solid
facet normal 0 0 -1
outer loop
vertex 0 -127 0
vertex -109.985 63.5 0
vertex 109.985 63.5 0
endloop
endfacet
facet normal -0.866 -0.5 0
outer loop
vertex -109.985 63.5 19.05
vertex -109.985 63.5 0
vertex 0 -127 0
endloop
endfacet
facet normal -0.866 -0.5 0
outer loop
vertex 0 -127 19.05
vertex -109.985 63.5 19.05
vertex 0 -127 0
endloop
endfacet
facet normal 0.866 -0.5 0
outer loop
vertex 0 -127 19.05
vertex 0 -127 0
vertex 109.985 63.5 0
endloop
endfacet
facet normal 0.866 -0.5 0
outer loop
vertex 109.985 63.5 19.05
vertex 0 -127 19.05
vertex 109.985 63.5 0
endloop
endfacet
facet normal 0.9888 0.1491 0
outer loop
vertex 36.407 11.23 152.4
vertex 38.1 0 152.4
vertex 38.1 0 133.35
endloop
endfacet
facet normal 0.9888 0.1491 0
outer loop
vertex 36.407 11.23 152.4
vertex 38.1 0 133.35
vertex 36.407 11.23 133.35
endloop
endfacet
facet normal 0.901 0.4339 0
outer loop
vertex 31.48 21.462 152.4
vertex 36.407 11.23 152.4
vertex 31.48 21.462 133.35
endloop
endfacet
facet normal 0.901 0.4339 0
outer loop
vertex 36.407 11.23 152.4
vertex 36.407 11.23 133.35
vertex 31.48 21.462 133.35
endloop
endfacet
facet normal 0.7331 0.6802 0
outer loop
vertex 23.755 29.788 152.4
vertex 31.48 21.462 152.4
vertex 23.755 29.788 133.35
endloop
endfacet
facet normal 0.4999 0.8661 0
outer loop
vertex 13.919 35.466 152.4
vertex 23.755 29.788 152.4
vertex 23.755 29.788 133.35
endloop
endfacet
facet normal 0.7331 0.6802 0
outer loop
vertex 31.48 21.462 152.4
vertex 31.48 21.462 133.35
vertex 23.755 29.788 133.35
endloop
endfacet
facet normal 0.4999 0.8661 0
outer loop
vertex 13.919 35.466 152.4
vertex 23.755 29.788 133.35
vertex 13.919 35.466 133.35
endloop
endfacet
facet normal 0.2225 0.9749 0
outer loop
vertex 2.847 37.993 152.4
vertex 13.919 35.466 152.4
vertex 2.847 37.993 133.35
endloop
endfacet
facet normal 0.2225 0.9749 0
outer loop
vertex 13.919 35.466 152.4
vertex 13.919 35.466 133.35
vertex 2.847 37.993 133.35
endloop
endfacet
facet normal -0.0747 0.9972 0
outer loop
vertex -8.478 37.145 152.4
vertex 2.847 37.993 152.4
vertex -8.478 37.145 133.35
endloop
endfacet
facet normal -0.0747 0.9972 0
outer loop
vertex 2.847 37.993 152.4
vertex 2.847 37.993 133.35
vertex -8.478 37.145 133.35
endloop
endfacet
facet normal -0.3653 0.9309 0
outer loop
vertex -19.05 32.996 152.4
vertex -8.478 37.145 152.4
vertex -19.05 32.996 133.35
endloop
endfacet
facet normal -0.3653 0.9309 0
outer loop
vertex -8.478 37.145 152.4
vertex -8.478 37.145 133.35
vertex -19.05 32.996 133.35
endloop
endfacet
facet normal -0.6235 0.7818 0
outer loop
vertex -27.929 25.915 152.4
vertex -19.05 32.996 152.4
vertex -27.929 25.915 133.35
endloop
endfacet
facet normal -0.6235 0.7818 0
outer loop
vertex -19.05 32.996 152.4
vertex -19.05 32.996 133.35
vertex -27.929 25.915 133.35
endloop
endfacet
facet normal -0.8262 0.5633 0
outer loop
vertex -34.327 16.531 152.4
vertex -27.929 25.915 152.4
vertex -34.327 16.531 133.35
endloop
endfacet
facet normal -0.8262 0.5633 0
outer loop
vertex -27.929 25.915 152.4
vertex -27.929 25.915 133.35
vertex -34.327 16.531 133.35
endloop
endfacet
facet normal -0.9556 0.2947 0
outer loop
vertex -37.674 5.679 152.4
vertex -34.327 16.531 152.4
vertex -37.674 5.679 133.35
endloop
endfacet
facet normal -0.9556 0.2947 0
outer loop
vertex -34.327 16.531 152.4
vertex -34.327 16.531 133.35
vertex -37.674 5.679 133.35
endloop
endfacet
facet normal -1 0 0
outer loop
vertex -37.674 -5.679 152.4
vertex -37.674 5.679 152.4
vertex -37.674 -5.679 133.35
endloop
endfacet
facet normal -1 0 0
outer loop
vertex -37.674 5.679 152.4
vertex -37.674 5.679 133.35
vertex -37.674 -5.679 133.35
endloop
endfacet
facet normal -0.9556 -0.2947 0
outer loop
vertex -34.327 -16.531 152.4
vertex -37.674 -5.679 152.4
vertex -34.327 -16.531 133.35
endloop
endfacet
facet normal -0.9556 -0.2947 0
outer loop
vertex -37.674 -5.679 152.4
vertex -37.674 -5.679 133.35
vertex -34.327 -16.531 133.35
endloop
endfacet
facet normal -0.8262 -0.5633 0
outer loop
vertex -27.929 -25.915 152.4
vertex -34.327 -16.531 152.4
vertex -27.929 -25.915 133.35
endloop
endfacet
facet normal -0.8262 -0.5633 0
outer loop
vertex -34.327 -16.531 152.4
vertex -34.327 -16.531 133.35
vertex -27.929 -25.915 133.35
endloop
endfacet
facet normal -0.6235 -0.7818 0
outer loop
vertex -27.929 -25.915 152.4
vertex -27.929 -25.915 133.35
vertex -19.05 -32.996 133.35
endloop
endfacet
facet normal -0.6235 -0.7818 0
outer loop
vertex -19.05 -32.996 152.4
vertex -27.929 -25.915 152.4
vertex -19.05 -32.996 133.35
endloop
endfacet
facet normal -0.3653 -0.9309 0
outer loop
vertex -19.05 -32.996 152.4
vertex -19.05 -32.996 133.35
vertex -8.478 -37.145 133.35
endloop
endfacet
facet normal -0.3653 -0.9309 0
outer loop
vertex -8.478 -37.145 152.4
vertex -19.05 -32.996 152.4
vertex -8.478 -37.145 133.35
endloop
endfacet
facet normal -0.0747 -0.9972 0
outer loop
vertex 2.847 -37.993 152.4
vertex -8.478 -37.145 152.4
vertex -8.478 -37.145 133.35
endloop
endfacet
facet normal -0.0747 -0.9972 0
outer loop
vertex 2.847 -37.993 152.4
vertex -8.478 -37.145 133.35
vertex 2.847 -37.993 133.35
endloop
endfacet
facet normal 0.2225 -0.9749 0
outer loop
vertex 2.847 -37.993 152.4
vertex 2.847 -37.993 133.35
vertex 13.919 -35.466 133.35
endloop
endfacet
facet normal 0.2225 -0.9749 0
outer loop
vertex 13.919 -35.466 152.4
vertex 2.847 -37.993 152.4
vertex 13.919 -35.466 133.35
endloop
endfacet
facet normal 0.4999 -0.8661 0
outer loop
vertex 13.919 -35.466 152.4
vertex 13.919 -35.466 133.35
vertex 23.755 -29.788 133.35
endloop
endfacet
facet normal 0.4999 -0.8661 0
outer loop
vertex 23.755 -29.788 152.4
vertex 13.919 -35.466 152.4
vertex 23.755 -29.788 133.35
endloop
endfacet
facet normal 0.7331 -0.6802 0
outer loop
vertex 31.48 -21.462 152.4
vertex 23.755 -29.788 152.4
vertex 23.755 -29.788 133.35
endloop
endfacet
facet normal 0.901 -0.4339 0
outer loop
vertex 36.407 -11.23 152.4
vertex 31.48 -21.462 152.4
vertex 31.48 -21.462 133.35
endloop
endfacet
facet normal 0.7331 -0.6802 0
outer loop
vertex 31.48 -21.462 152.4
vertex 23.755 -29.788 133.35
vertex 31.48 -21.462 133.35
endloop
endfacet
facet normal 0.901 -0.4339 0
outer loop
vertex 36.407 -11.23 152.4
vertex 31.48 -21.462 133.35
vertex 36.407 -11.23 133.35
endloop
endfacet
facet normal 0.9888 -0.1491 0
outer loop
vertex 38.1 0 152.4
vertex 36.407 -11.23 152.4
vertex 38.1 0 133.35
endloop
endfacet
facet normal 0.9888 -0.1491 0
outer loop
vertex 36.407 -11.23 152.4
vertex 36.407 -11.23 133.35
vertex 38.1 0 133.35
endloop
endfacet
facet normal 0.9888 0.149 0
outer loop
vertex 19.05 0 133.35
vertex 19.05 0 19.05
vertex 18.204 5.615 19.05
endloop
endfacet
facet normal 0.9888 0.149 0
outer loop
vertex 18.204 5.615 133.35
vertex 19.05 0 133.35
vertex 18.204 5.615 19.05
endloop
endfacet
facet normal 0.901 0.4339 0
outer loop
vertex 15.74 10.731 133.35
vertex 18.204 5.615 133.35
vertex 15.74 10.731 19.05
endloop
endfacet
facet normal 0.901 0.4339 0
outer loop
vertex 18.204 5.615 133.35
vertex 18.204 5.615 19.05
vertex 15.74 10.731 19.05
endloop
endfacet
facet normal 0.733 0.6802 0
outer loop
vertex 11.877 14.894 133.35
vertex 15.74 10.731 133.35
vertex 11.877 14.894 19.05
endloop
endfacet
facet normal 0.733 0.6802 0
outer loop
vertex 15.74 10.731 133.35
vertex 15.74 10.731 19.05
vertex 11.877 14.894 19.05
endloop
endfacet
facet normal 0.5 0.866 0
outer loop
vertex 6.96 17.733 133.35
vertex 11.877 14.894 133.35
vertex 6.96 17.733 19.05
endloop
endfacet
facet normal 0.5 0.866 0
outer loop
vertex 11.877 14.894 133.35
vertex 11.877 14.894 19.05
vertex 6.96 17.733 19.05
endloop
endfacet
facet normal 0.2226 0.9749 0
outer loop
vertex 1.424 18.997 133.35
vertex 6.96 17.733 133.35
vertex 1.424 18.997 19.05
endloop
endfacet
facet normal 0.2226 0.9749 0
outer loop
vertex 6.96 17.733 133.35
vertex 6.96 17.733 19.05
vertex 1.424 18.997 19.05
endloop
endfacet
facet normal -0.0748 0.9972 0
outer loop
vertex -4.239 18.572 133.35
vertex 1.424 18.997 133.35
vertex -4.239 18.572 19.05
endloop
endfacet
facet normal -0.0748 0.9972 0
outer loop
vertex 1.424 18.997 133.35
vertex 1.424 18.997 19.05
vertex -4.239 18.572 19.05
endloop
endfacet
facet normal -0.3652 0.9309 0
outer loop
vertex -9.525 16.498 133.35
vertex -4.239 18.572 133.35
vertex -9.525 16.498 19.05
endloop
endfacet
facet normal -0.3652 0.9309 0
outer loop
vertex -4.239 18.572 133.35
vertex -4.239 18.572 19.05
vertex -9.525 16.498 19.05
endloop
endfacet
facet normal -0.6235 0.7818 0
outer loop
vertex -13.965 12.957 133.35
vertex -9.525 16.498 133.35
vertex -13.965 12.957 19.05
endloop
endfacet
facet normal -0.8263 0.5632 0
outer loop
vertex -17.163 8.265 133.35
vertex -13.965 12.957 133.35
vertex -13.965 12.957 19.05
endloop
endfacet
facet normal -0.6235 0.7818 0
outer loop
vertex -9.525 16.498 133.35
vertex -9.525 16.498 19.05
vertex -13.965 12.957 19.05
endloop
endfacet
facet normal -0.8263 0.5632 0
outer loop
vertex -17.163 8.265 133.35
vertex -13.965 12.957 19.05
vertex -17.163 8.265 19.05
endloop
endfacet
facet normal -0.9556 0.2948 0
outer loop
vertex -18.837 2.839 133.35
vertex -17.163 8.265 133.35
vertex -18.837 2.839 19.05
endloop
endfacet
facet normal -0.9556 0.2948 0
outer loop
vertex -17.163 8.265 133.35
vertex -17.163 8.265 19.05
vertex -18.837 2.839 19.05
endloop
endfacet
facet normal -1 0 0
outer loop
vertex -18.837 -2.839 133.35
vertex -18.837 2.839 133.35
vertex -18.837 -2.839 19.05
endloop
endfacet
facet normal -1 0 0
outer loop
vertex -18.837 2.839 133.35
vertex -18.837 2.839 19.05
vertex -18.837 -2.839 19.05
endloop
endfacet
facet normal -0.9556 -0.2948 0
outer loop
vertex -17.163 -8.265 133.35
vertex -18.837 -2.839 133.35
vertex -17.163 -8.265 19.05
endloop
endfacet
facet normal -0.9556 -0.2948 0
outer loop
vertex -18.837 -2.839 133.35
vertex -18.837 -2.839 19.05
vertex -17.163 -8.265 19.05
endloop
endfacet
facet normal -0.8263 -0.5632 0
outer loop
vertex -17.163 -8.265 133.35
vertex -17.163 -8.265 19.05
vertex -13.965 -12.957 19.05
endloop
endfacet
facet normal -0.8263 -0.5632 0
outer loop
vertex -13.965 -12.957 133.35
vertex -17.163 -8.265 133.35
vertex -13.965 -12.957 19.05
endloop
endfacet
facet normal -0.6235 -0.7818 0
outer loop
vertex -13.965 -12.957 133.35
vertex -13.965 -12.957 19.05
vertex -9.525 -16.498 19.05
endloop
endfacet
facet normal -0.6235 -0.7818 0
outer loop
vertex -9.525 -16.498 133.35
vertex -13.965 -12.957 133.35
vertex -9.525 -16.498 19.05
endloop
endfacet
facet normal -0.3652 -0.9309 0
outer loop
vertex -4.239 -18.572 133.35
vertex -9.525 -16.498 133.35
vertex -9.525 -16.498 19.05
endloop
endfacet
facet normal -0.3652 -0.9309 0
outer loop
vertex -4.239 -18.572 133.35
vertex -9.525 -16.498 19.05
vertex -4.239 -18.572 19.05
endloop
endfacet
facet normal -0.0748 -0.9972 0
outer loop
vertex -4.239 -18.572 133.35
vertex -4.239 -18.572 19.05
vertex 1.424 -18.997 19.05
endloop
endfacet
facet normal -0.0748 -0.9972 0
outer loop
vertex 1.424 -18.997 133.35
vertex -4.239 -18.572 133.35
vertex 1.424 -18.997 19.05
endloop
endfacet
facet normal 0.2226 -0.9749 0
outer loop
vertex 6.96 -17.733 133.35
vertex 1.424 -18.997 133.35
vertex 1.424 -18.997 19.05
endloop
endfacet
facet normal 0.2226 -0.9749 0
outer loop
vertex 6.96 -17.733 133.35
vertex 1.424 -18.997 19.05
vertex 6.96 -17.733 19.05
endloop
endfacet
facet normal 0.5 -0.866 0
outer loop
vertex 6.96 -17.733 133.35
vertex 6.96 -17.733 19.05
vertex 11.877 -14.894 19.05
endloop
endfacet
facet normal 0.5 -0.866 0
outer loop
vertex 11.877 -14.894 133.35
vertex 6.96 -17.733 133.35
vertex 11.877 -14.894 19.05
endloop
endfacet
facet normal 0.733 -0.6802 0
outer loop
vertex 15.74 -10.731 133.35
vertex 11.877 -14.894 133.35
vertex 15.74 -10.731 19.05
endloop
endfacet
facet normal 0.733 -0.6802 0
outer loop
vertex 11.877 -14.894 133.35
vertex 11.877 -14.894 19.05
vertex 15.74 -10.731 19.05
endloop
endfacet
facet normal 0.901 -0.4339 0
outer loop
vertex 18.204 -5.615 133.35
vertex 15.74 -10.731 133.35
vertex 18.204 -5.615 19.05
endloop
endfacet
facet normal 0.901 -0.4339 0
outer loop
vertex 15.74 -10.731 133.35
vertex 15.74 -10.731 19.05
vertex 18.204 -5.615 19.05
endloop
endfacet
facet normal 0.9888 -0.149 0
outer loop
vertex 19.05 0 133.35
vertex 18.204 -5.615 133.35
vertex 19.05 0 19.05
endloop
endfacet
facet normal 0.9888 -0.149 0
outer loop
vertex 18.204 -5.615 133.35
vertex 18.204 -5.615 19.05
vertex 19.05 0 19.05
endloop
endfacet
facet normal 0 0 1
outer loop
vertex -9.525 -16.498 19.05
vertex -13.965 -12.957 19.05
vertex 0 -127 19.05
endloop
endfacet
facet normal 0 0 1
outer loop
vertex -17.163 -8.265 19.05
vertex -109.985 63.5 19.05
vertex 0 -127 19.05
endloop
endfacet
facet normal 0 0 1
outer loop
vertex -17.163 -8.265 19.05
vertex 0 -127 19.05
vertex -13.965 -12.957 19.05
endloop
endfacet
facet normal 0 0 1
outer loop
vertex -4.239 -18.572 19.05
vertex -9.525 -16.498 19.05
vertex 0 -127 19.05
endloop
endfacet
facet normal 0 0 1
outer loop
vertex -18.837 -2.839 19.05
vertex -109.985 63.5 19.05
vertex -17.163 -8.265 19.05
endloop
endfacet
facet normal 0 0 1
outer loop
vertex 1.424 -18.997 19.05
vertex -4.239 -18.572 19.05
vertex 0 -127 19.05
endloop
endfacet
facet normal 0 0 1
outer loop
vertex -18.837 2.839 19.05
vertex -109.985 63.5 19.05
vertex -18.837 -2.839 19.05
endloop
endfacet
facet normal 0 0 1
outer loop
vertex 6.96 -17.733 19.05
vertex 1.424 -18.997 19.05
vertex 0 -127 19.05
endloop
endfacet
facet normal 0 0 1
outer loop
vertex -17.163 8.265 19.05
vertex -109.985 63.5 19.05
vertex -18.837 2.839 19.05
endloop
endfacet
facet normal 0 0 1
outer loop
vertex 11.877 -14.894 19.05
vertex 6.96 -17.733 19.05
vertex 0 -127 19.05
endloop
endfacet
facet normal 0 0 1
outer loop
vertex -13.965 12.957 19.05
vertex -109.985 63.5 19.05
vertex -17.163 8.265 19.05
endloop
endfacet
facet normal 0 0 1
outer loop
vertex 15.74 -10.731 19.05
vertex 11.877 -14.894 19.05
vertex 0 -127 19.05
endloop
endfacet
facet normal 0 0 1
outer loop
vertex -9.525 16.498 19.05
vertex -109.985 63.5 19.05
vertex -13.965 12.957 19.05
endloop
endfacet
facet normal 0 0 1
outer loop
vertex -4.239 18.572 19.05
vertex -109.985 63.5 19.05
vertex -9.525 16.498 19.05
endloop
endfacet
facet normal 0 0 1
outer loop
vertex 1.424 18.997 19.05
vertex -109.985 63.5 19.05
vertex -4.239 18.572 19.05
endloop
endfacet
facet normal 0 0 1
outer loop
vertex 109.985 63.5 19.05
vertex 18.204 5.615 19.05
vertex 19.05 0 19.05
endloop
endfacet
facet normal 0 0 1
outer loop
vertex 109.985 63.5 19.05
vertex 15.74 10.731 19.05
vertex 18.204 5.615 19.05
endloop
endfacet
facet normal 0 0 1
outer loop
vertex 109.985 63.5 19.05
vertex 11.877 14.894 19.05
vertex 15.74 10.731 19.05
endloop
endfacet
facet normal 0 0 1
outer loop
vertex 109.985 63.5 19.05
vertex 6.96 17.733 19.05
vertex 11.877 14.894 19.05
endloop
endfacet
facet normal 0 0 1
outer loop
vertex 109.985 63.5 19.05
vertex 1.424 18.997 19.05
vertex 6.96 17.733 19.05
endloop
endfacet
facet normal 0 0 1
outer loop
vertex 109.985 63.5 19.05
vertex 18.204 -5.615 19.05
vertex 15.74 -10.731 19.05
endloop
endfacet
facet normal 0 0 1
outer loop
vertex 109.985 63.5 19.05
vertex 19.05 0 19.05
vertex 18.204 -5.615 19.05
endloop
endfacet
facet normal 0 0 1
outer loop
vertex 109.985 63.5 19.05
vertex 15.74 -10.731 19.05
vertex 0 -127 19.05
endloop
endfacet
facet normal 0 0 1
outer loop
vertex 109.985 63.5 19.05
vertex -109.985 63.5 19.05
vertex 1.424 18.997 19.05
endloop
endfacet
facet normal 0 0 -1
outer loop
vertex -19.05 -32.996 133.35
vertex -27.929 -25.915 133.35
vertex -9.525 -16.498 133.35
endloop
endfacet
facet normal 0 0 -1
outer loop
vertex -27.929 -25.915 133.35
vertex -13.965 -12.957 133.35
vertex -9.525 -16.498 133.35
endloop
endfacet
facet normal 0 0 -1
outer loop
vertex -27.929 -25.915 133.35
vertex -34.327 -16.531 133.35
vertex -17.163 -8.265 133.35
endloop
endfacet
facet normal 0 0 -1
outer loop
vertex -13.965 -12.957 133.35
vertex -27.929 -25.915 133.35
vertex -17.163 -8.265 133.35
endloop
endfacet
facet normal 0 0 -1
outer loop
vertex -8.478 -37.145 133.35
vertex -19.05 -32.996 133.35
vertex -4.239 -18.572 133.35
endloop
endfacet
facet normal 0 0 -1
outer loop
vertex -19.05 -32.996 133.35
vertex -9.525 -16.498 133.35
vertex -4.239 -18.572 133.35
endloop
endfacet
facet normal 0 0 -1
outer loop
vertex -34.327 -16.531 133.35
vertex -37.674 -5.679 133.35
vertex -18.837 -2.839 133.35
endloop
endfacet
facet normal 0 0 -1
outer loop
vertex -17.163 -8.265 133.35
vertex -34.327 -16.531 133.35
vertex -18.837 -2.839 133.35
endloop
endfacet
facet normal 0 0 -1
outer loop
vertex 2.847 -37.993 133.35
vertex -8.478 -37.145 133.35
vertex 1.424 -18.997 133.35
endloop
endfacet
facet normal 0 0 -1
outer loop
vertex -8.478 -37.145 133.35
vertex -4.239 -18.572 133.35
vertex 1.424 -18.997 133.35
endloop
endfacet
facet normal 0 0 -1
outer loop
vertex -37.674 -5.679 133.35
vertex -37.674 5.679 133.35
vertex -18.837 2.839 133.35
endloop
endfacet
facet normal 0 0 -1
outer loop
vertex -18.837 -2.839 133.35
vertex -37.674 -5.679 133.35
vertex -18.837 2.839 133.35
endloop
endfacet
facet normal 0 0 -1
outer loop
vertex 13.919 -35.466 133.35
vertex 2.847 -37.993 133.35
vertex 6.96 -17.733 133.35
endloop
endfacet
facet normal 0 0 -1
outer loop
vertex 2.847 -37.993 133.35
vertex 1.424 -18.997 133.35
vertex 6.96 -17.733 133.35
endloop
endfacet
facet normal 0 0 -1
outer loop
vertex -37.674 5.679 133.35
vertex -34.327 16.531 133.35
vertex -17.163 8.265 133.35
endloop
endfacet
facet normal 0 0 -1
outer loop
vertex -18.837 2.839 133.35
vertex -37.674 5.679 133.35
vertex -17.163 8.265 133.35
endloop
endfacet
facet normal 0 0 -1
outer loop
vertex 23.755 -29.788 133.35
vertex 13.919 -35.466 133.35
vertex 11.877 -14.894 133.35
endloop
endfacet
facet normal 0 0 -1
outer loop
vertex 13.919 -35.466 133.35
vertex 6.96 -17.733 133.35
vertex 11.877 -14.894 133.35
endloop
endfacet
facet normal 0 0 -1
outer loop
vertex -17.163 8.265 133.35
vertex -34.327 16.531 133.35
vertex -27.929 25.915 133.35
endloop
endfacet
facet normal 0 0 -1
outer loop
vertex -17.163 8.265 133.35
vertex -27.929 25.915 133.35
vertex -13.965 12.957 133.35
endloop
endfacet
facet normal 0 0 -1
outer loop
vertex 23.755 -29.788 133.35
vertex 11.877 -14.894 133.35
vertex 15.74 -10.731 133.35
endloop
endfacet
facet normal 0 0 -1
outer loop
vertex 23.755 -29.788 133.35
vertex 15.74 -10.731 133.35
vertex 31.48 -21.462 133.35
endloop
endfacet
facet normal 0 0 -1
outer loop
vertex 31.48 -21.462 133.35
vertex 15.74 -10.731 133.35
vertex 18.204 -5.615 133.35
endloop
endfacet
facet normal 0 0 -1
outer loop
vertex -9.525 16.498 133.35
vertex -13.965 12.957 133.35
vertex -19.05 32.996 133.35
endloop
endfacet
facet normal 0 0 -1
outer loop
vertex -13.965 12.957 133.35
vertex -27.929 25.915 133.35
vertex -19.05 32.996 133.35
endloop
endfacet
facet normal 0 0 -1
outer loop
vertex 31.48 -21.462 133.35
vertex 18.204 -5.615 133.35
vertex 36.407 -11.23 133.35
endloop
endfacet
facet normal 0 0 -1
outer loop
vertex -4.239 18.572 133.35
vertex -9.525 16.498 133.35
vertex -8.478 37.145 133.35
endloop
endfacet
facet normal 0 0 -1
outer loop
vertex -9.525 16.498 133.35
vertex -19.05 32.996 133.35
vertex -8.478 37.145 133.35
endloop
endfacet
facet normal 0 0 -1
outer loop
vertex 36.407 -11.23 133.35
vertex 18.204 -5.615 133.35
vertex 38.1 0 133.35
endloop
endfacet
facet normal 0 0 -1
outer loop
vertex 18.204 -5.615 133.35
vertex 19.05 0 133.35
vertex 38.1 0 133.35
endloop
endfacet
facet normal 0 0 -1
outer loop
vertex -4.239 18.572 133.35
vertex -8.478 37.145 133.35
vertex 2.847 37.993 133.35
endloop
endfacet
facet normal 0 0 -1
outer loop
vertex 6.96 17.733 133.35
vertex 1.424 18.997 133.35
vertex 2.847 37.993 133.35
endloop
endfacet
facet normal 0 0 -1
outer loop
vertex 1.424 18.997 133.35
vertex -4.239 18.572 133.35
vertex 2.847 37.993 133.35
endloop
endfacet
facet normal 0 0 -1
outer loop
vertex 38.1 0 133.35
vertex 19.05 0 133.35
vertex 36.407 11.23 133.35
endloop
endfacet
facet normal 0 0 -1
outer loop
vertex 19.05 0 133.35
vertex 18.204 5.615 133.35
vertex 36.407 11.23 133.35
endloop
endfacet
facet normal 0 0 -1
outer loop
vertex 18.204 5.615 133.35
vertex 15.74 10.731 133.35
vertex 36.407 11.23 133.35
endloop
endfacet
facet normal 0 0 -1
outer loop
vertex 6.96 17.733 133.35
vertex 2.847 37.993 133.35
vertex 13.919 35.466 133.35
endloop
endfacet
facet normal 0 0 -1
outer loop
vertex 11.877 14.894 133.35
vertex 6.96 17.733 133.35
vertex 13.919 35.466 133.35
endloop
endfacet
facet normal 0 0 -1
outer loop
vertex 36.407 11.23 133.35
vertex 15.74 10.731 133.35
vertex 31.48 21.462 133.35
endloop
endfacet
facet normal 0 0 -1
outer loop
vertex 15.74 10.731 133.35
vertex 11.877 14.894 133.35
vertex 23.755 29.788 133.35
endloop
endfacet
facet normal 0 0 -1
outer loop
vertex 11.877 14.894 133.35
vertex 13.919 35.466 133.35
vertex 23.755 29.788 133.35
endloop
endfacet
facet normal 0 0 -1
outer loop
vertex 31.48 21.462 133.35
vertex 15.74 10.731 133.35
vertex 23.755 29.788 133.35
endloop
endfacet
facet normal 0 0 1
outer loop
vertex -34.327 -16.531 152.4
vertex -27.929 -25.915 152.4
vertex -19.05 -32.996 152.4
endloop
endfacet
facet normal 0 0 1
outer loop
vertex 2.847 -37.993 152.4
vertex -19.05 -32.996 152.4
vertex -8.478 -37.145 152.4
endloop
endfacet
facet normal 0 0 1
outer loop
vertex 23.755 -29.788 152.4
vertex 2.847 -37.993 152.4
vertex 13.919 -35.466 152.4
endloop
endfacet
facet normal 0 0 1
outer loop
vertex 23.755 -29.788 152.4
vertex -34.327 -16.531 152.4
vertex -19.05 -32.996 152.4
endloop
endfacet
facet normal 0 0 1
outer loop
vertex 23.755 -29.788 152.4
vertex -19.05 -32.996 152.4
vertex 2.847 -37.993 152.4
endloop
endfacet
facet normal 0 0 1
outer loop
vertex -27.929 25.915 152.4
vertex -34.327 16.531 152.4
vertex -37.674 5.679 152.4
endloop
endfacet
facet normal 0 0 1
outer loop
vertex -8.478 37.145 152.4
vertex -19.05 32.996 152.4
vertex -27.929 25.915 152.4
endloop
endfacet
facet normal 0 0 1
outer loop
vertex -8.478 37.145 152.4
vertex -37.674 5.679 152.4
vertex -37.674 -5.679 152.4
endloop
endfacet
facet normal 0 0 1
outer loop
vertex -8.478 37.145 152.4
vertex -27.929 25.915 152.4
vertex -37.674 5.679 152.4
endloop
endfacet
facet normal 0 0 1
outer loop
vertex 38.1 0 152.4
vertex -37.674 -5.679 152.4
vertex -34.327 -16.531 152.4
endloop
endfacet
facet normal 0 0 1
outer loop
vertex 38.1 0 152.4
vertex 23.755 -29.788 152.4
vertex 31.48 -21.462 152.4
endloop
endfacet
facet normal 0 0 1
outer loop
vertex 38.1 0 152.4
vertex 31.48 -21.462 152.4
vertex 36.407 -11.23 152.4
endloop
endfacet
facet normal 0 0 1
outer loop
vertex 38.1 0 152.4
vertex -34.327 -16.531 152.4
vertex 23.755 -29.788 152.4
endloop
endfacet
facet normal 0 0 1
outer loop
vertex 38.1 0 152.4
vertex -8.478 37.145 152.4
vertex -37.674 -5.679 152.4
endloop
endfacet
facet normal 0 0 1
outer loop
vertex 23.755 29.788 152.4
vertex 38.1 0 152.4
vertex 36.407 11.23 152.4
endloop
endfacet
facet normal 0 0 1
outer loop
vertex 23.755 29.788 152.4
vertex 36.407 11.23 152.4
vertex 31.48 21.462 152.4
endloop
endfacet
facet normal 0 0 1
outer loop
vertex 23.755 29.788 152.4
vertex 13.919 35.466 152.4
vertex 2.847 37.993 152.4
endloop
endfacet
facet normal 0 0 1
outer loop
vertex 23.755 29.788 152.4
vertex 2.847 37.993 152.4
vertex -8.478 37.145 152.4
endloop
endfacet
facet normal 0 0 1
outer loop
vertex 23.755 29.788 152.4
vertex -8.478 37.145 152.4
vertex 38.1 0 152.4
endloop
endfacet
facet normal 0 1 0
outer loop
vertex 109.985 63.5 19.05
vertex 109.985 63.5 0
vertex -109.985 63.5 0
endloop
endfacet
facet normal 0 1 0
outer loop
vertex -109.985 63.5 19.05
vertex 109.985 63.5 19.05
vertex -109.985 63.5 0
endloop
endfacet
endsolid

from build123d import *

# Parameters (mm, degrees)
F1_DEPTH = 19.05
F2_R     = 19.05
F3_DEPTH = 114.3
F4_R     = 38.1
F4_R_2   = 19.05
F5_DEPTH = 19.05


with BuildPart() as f1:
    # F0 (on Top) → F1 (new body)
    with BuildSketch(Plane.XY):
        Polygon((-109.985226, 63.5), (0, -127), (109.985226, 63.5), align=None)
    extrude(amount=F1_DEPTH)

    # F2 (on face) → F3 (join)
    with BuildSketch(Plane.XY.offset(19.05)):
        Circle(F2_R)
    extrude(amount=F3_DEPTH)

    # F4 (on face) → F5 (join)
    with BuildSketch(Plane.XY.offset(133.35)):
        Circle(F4_R)
        Circle(F4_R_2, mode=Mode.SUBTRACT)
        Circle(F4_R_2)
    extrude(amount=F5_DEPTH)


solid = f1.part
